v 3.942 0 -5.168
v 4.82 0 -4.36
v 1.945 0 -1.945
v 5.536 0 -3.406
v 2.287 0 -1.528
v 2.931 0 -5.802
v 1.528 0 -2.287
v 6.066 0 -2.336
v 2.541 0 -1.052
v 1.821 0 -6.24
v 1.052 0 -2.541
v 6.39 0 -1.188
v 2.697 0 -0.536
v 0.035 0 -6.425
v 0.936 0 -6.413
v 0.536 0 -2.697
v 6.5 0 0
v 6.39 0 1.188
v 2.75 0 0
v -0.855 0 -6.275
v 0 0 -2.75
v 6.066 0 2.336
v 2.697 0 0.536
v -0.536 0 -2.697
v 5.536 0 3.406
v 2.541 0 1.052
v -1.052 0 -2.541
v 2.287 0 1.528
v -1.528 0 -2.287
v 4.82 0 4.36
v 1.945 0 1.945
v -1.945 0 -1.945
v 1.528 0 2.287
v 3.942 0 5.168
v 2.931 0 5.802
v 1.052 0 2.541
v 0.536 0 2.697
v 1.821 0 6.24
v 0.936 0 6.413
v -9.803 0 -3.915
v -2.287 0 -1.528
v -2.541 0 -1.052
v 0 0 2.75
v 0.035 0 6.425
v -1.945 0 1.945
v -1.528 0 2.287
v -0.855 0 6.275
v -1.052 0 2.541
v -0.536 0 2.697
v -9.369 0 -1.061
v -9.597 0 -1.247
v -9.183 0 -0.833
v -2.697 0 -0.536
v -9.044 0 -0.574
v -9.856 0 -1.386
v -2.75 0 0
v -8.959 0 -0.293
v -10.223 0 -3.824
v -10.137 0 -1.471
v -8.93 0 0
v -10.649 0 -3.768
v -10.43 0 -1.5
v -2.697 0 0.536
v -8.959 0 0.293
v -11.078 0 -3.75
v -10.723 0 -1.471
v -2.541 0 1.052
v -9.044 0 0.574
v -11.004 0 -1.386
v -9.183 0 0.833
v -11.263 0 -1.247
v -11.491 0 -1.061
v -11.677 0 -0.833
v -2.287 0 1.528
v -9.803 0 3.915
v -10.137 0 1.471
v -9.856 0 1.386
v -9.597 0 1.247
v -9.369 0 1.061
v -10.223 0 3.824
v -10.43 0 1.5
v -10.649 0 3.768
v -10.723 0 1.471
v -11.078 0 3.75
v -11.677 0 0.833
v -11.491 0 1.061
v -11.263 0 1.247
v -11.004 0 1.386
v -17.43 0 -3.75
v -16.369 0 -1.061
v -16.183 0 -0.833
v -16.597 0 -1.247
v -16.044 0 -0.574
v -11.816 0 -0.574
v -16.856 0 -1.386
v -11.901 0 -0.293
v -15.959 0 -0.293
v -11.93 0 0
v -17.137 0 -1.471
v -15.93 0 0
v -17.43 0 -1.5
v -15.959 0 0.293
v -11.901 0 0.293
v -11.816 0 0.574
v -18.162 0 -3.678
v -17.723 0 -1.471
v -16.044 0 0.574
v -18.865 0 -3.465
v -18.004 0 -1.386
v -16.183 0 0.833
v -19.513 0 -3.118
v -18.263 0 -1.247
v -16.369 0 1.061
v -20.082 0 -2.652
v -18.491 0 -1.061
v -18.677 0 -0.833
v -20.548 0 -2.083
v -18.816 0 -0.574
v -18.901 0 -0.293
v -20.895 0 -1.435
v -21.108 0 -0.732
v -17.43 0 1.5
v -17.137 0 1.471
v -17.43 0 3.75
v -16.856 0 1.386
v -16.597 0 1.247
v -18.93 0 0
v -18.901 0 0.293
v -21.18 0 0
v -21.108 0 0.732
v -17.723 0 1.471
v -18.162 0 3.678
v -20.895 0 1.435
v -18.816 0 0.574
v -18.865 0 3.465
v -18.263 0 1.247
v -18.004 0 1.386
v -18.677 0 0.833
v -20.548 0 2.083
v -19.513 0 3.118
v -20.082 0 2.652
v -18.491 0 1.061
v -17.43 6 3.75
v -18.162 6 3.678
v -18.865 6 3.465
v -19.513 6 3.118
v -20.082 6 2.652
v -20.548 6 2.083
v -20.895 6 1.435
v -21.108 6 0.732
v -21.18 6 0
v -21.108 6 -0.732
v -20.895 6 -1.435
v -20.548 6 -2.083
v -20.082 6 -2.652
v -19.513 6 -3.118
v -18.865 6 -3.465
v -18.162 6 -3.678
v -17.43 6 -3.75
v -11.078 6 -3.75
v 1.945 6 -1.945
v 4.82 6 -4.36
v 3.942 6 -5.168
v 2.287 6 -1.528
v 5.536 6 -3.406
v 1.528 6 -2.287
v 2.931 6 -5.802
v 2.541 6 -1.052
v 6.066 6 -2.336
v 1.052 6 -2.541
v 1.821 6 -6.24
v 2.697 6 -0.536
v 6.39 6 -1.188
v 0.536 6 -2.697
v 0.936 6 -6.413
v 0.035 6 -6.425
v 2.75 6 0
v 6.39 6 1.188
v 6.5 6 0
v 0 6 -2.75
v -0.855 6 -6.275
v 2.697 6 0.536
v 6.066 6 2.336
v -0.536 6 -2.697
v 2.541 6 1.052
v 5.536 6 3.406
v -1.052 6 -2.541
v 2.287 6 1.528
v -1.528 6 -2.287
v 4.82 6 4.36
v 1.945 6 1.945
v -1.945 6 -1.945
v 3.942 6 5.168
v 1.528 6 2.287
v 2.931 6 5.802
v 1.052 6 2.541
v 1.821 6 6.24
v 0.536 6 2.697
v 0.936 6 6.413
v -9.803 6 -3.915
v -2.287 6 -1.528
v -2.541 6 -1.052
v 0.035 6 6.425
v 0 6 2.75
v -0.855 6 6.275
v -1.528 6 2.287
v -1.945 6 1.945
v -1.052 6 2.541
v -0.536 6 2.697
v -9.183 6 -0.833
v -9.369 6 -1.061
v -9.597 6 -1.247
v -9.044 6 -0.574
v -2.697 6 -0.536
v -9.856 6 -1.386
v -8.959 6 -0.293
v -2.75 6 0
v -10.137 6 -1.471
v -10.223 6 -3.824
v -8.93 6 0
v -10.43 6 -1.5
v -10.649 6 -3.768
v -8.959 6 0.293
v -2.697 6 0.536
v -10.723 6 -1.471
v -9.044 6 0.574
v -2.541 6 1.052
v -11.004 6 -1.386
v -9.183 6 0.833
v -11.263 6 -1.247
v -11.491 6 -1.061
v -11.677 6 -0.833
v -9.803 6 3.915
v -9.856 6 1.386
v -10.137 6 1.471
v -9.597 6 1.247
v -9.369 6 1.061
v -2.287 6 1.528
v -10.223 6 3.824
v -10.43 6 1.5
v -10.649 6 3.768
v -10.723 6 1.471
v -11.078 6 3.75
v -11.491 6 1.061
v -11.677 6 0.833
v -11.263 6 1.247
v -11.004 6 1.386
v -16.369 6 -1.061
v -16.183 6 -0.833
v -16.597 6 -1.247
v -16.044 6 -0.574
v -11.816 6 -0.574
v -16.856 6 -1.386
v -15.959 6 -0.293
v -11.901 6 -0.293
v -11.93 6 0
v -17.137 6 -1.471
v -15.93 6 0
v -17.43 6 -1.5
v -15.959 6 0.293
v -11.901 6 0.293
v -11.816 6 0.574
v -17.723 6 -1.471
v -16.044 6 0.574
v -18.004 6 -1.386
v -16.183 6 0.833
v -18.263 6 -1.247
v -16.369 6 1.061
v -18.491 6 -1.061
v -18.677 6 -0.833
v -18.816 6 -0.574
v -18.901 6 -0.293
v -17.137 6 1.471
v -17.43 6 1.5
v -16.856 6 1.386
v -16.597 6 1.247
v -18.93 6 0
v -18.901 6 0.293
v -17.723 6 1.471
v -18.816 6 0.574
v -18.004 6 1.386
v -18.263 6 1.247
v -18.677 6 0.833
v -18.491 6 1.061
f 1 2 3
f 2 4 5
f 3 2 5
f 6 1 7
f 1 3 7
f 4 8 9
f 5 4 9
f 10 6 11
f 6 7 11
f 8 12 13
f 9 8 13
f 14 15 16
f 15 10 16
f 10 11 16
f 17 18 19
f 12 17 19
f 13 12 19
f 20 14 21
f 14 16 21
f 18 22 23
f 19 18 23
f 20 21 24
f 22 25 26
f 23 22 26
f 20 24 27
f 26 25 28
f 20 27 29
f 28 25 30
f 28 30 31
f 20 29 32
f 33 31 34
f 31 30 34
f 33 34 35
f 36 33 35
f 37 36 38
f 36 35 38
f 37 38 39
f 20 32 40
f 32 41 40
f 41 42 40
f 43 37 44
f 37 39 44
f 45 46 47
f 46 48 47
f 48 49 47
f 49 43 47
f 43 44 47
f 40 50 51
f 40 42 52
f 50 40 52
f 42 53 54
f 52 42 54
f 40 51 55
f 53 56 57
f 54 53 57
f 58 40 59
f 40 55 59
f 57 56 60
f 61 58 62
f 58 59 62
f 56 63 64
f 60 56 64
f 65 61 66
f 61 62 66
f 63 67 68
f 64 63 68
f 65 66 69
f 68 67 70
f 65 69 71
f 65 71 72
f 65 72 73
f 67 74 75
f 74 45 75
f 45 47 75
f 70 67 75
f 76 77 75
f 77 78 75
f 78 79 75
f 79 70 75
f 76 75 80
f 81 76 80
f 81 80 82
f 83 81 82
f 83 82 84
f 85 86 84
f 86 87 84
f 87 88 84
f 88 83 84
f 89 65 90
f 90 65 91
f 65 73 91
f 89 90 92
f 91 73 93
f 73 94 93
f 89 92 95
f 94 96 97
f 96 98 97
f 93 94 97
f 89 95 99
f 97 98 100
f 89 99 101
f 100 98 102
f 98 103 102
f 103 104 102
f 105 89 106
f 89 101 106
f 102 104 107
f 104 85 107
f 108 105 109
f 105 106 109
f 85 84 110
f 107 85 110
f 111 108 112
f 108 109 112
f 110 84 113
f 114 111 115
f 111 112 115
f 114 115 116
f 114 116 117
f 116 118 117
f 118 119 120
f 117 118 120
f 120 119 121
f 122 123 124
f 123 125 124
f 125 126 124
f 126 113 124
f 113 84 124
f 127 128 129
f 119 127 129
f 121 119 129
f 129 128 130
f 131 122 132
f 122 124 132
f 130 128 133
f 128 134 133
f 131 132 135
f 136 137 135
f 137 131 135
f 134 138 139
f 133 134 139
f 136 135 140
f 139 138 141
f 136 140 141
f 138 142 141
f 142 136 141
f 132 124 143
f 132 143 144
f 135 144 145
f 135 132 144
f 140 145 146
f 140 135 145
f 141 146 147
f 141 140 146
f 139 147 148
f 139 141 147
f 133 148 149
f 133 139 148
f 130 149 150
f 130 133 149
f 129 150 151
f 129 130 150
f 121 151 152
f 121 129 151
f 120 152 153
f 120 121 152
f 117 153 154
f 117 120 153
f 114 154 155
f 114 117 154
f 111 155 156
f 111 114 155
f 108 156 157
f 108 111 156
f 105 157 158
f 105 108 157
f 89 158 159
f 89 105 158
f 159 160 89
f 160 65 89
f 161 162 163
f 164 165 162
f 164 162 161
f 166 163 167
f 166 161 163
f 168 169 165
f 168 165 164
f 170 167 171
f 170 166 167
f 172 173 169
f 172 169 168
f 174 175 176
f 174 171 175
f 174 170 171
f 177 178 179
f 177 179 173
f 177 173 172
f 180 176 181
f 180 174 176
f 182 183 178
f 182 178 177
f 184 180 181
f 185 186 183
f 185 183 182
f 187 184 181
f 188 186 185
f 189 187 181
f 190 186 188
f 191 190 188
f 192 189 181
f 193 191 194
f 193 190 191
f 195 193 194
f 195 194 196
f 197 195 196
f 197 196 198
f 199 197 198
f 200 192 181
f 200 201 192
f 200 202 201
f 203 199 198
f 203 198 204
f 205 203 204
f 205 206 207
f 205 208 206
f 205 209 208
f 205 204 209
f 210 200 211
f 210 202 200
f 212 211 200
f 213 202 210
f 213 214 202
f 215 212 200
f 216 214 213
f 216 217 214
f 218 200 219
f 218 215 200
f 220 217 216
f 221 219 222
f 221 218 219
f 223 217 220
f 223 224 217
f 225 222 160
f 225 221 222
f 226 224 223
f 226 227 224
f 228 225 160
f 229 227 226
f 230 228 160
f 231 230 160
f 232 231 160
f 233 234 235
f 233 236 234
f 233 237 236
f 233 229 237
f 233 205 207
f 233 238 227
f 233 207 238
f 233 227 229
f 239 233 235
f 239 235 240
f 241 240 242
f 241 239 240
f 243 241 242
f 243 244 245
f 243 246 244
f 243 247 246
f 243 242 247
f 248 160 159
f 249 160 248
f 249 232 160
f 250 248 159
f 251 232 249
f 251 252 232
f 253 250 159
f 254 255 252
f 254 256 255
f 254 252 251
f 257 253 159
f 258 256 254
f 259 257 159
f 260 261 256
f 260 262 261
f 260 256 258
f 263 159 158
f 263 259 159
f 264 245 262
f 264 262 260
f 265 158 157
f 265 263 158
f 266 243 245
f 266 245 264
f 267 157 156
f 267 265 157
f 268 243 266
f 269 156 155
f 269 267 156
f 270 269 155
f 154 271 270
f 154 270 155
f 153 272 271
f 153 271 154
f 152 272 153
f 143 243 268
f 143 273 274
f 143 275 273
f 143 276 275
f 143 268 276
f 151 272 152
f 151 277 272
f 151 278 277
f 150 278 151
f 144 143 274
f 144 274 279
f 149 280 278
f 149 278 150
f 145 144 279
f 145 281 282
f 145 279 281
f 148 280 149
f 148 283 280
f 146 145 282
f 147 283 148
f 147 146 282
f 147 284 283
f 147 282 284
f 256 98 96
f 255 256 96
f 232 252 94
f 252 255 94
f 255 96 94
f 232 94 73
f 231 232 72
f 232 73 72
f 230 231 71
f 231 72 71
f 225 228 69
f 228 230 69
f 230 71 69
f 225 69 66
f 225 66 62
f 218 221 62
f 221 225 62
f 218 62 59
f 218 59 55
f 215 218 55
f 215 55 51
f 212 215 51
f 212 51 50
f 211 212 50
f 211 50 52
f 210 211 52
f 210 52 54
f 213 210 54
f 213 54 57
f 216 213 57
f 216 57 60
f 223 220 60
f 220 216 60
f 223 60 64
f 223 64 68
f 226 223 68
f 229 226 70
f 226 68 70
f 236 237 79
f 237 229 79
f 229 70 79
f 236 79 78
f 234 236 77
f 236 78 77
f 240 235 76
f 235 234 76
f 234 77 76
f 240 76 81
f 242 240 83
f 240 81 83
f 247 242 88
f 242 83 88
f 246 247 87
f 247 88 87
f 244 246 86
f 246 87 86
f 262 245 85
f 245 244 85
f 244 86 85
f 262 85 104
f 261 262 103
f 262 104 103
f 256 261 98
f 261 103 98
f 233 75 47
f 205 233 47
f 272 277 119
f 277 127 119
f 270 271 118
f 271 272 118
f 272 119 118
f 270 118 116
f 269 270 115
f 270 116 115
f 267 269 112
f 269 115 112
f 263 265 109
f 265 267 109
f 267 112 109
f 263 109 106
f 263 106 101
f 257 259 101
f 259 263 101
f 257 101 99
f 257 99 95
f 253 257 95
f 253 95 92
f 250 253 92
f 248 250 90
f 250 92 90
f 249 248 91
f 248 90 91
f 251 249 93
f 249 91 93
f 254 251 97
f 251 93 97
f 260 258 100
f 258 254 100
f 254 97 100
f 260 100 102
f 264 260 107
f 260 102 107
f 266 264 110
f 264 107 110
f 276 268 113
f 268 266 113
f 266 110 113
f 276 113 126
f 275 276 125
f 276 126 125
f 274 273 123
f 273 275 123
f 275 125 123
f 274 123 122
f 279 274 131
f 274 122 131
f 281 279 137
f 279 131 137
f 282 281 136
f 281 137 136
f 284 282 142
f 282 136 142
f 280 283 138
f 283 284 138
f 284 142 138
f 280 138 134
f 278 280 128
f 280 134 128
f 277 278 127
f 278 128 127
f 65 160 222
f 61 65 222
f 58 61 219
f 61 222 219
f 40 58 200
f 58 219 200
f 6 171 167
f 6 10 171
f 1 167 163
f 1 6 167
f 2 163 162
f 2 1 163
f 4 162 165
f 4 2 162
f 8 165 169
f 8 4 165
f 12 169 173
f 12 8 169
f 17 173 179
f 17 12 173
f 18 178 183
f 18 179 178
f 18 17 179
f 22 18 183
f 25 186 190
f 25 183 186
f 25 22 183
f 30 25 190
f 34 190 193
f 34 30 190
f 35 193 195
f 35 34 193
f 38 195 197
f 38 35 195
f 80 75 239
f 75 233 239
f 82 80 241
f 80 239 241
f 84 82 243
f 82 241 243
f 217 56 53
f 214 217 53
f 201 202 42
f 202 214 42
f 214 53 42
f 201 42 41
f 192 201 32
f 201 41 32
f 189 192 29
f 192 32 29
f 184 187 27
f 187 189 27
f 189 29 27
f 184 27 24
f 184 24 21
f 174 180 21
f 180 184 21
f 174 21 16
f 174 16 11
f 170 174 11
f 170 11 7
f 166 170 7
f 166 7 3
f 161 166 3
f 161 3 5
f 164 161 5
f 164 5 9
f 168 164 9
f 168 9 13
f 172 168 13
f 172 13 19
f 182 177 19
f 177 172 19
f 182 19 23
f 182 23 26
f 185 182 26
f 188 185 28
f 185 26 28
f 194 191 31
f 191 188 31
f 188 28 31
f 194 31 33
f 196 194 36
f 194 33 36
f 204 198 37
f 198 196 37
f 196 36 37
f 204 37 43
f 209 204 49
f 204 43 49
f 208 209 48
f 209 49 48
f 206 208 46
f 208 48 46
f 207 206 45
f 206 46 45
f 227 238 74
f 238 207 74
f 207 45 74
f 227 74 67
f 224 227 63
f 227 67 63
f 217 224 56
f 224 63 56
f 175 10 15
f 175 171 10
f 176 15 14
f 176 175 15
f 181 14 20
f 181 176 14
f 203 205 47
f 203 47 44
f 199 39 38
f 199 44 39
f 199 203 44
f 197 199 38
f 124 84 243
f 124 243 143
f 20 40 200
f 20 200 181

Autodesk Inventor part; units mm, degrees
ref_plane "YZ Plane" through (0, 0, 0) normal (1, 0, 0) x (0, 1, 0)
ref_plane "XZ Plane" through (0, 0, 0) normal (0, 1, 0) x (-1, 0, 0)
ref_plane "XY Plane" through (0, 0, 0) normal (0, 0, 1) x (1, 0, 0)
sketch "Sketch1" plane through (0, 0, 0) normal (0, 1, 0) x (-1, 0, 0)
  arc A0 (0, 6.5) -> (0, -6.5) centre (0, 0) ccw
  arc A1 (17.43, -3.75) -> (17.43, 3.75) centre (17.43, 0) ccw
  line L0 (10.43, 3.75) -> (17.43, 3.75)
  line L1 (10.43, -3.75) -> (17.43, -3.75)
  line L2 (0, 0) -> (20.86, 0) construction
  circle A2 centre (0, 0) radius 2.75
  circle A3 centre (17.43, 0) radius 1.5
  circle A4 centre (10.43, 0) radius 1.5
  line L3 (10.43, 3.75) -> (0, 6.5)
  line L4 (10.43, -3.75) -> (0, -6.5)
  line L5 (10.43, 0) -> (10.43, -12.3931) construction
  line L6 (0, 8.169) -> (0, -9.3531) construction
  dimension "d0" = 13
  dimension "d1" = 7.5
  dimension "d2" = 17.43
  dimension "d3" = 7.5
  dimension "d6" = 0
  dimension "d7" = 3.75
  dimension "d8" = 5.5
  dimension "d10" = 3
  dimension "d11" = 3
  dimension "d14" = 7
  dimension "d17" = 17.43
  dimension "d20" = 0
  dimension "d21" = 0
  dimension "d22" = 0
  dimension "d23" = 0
  dimension "d24" = 0
extrude "Extrusion1" add sketch "Sketch1" along normal blind 6
fillet "Fillet1" radius 5 1 edges at (-10.43, 3, 3.75)
fillet "Fillet2" radius 5 1 edges at (-10.43, 3, -3.75)
fillet "Fillet3" radius 5 2 edges at (0, 3, -6.5) (0, 3, 6.5)
properties part number "adaptator_25"
